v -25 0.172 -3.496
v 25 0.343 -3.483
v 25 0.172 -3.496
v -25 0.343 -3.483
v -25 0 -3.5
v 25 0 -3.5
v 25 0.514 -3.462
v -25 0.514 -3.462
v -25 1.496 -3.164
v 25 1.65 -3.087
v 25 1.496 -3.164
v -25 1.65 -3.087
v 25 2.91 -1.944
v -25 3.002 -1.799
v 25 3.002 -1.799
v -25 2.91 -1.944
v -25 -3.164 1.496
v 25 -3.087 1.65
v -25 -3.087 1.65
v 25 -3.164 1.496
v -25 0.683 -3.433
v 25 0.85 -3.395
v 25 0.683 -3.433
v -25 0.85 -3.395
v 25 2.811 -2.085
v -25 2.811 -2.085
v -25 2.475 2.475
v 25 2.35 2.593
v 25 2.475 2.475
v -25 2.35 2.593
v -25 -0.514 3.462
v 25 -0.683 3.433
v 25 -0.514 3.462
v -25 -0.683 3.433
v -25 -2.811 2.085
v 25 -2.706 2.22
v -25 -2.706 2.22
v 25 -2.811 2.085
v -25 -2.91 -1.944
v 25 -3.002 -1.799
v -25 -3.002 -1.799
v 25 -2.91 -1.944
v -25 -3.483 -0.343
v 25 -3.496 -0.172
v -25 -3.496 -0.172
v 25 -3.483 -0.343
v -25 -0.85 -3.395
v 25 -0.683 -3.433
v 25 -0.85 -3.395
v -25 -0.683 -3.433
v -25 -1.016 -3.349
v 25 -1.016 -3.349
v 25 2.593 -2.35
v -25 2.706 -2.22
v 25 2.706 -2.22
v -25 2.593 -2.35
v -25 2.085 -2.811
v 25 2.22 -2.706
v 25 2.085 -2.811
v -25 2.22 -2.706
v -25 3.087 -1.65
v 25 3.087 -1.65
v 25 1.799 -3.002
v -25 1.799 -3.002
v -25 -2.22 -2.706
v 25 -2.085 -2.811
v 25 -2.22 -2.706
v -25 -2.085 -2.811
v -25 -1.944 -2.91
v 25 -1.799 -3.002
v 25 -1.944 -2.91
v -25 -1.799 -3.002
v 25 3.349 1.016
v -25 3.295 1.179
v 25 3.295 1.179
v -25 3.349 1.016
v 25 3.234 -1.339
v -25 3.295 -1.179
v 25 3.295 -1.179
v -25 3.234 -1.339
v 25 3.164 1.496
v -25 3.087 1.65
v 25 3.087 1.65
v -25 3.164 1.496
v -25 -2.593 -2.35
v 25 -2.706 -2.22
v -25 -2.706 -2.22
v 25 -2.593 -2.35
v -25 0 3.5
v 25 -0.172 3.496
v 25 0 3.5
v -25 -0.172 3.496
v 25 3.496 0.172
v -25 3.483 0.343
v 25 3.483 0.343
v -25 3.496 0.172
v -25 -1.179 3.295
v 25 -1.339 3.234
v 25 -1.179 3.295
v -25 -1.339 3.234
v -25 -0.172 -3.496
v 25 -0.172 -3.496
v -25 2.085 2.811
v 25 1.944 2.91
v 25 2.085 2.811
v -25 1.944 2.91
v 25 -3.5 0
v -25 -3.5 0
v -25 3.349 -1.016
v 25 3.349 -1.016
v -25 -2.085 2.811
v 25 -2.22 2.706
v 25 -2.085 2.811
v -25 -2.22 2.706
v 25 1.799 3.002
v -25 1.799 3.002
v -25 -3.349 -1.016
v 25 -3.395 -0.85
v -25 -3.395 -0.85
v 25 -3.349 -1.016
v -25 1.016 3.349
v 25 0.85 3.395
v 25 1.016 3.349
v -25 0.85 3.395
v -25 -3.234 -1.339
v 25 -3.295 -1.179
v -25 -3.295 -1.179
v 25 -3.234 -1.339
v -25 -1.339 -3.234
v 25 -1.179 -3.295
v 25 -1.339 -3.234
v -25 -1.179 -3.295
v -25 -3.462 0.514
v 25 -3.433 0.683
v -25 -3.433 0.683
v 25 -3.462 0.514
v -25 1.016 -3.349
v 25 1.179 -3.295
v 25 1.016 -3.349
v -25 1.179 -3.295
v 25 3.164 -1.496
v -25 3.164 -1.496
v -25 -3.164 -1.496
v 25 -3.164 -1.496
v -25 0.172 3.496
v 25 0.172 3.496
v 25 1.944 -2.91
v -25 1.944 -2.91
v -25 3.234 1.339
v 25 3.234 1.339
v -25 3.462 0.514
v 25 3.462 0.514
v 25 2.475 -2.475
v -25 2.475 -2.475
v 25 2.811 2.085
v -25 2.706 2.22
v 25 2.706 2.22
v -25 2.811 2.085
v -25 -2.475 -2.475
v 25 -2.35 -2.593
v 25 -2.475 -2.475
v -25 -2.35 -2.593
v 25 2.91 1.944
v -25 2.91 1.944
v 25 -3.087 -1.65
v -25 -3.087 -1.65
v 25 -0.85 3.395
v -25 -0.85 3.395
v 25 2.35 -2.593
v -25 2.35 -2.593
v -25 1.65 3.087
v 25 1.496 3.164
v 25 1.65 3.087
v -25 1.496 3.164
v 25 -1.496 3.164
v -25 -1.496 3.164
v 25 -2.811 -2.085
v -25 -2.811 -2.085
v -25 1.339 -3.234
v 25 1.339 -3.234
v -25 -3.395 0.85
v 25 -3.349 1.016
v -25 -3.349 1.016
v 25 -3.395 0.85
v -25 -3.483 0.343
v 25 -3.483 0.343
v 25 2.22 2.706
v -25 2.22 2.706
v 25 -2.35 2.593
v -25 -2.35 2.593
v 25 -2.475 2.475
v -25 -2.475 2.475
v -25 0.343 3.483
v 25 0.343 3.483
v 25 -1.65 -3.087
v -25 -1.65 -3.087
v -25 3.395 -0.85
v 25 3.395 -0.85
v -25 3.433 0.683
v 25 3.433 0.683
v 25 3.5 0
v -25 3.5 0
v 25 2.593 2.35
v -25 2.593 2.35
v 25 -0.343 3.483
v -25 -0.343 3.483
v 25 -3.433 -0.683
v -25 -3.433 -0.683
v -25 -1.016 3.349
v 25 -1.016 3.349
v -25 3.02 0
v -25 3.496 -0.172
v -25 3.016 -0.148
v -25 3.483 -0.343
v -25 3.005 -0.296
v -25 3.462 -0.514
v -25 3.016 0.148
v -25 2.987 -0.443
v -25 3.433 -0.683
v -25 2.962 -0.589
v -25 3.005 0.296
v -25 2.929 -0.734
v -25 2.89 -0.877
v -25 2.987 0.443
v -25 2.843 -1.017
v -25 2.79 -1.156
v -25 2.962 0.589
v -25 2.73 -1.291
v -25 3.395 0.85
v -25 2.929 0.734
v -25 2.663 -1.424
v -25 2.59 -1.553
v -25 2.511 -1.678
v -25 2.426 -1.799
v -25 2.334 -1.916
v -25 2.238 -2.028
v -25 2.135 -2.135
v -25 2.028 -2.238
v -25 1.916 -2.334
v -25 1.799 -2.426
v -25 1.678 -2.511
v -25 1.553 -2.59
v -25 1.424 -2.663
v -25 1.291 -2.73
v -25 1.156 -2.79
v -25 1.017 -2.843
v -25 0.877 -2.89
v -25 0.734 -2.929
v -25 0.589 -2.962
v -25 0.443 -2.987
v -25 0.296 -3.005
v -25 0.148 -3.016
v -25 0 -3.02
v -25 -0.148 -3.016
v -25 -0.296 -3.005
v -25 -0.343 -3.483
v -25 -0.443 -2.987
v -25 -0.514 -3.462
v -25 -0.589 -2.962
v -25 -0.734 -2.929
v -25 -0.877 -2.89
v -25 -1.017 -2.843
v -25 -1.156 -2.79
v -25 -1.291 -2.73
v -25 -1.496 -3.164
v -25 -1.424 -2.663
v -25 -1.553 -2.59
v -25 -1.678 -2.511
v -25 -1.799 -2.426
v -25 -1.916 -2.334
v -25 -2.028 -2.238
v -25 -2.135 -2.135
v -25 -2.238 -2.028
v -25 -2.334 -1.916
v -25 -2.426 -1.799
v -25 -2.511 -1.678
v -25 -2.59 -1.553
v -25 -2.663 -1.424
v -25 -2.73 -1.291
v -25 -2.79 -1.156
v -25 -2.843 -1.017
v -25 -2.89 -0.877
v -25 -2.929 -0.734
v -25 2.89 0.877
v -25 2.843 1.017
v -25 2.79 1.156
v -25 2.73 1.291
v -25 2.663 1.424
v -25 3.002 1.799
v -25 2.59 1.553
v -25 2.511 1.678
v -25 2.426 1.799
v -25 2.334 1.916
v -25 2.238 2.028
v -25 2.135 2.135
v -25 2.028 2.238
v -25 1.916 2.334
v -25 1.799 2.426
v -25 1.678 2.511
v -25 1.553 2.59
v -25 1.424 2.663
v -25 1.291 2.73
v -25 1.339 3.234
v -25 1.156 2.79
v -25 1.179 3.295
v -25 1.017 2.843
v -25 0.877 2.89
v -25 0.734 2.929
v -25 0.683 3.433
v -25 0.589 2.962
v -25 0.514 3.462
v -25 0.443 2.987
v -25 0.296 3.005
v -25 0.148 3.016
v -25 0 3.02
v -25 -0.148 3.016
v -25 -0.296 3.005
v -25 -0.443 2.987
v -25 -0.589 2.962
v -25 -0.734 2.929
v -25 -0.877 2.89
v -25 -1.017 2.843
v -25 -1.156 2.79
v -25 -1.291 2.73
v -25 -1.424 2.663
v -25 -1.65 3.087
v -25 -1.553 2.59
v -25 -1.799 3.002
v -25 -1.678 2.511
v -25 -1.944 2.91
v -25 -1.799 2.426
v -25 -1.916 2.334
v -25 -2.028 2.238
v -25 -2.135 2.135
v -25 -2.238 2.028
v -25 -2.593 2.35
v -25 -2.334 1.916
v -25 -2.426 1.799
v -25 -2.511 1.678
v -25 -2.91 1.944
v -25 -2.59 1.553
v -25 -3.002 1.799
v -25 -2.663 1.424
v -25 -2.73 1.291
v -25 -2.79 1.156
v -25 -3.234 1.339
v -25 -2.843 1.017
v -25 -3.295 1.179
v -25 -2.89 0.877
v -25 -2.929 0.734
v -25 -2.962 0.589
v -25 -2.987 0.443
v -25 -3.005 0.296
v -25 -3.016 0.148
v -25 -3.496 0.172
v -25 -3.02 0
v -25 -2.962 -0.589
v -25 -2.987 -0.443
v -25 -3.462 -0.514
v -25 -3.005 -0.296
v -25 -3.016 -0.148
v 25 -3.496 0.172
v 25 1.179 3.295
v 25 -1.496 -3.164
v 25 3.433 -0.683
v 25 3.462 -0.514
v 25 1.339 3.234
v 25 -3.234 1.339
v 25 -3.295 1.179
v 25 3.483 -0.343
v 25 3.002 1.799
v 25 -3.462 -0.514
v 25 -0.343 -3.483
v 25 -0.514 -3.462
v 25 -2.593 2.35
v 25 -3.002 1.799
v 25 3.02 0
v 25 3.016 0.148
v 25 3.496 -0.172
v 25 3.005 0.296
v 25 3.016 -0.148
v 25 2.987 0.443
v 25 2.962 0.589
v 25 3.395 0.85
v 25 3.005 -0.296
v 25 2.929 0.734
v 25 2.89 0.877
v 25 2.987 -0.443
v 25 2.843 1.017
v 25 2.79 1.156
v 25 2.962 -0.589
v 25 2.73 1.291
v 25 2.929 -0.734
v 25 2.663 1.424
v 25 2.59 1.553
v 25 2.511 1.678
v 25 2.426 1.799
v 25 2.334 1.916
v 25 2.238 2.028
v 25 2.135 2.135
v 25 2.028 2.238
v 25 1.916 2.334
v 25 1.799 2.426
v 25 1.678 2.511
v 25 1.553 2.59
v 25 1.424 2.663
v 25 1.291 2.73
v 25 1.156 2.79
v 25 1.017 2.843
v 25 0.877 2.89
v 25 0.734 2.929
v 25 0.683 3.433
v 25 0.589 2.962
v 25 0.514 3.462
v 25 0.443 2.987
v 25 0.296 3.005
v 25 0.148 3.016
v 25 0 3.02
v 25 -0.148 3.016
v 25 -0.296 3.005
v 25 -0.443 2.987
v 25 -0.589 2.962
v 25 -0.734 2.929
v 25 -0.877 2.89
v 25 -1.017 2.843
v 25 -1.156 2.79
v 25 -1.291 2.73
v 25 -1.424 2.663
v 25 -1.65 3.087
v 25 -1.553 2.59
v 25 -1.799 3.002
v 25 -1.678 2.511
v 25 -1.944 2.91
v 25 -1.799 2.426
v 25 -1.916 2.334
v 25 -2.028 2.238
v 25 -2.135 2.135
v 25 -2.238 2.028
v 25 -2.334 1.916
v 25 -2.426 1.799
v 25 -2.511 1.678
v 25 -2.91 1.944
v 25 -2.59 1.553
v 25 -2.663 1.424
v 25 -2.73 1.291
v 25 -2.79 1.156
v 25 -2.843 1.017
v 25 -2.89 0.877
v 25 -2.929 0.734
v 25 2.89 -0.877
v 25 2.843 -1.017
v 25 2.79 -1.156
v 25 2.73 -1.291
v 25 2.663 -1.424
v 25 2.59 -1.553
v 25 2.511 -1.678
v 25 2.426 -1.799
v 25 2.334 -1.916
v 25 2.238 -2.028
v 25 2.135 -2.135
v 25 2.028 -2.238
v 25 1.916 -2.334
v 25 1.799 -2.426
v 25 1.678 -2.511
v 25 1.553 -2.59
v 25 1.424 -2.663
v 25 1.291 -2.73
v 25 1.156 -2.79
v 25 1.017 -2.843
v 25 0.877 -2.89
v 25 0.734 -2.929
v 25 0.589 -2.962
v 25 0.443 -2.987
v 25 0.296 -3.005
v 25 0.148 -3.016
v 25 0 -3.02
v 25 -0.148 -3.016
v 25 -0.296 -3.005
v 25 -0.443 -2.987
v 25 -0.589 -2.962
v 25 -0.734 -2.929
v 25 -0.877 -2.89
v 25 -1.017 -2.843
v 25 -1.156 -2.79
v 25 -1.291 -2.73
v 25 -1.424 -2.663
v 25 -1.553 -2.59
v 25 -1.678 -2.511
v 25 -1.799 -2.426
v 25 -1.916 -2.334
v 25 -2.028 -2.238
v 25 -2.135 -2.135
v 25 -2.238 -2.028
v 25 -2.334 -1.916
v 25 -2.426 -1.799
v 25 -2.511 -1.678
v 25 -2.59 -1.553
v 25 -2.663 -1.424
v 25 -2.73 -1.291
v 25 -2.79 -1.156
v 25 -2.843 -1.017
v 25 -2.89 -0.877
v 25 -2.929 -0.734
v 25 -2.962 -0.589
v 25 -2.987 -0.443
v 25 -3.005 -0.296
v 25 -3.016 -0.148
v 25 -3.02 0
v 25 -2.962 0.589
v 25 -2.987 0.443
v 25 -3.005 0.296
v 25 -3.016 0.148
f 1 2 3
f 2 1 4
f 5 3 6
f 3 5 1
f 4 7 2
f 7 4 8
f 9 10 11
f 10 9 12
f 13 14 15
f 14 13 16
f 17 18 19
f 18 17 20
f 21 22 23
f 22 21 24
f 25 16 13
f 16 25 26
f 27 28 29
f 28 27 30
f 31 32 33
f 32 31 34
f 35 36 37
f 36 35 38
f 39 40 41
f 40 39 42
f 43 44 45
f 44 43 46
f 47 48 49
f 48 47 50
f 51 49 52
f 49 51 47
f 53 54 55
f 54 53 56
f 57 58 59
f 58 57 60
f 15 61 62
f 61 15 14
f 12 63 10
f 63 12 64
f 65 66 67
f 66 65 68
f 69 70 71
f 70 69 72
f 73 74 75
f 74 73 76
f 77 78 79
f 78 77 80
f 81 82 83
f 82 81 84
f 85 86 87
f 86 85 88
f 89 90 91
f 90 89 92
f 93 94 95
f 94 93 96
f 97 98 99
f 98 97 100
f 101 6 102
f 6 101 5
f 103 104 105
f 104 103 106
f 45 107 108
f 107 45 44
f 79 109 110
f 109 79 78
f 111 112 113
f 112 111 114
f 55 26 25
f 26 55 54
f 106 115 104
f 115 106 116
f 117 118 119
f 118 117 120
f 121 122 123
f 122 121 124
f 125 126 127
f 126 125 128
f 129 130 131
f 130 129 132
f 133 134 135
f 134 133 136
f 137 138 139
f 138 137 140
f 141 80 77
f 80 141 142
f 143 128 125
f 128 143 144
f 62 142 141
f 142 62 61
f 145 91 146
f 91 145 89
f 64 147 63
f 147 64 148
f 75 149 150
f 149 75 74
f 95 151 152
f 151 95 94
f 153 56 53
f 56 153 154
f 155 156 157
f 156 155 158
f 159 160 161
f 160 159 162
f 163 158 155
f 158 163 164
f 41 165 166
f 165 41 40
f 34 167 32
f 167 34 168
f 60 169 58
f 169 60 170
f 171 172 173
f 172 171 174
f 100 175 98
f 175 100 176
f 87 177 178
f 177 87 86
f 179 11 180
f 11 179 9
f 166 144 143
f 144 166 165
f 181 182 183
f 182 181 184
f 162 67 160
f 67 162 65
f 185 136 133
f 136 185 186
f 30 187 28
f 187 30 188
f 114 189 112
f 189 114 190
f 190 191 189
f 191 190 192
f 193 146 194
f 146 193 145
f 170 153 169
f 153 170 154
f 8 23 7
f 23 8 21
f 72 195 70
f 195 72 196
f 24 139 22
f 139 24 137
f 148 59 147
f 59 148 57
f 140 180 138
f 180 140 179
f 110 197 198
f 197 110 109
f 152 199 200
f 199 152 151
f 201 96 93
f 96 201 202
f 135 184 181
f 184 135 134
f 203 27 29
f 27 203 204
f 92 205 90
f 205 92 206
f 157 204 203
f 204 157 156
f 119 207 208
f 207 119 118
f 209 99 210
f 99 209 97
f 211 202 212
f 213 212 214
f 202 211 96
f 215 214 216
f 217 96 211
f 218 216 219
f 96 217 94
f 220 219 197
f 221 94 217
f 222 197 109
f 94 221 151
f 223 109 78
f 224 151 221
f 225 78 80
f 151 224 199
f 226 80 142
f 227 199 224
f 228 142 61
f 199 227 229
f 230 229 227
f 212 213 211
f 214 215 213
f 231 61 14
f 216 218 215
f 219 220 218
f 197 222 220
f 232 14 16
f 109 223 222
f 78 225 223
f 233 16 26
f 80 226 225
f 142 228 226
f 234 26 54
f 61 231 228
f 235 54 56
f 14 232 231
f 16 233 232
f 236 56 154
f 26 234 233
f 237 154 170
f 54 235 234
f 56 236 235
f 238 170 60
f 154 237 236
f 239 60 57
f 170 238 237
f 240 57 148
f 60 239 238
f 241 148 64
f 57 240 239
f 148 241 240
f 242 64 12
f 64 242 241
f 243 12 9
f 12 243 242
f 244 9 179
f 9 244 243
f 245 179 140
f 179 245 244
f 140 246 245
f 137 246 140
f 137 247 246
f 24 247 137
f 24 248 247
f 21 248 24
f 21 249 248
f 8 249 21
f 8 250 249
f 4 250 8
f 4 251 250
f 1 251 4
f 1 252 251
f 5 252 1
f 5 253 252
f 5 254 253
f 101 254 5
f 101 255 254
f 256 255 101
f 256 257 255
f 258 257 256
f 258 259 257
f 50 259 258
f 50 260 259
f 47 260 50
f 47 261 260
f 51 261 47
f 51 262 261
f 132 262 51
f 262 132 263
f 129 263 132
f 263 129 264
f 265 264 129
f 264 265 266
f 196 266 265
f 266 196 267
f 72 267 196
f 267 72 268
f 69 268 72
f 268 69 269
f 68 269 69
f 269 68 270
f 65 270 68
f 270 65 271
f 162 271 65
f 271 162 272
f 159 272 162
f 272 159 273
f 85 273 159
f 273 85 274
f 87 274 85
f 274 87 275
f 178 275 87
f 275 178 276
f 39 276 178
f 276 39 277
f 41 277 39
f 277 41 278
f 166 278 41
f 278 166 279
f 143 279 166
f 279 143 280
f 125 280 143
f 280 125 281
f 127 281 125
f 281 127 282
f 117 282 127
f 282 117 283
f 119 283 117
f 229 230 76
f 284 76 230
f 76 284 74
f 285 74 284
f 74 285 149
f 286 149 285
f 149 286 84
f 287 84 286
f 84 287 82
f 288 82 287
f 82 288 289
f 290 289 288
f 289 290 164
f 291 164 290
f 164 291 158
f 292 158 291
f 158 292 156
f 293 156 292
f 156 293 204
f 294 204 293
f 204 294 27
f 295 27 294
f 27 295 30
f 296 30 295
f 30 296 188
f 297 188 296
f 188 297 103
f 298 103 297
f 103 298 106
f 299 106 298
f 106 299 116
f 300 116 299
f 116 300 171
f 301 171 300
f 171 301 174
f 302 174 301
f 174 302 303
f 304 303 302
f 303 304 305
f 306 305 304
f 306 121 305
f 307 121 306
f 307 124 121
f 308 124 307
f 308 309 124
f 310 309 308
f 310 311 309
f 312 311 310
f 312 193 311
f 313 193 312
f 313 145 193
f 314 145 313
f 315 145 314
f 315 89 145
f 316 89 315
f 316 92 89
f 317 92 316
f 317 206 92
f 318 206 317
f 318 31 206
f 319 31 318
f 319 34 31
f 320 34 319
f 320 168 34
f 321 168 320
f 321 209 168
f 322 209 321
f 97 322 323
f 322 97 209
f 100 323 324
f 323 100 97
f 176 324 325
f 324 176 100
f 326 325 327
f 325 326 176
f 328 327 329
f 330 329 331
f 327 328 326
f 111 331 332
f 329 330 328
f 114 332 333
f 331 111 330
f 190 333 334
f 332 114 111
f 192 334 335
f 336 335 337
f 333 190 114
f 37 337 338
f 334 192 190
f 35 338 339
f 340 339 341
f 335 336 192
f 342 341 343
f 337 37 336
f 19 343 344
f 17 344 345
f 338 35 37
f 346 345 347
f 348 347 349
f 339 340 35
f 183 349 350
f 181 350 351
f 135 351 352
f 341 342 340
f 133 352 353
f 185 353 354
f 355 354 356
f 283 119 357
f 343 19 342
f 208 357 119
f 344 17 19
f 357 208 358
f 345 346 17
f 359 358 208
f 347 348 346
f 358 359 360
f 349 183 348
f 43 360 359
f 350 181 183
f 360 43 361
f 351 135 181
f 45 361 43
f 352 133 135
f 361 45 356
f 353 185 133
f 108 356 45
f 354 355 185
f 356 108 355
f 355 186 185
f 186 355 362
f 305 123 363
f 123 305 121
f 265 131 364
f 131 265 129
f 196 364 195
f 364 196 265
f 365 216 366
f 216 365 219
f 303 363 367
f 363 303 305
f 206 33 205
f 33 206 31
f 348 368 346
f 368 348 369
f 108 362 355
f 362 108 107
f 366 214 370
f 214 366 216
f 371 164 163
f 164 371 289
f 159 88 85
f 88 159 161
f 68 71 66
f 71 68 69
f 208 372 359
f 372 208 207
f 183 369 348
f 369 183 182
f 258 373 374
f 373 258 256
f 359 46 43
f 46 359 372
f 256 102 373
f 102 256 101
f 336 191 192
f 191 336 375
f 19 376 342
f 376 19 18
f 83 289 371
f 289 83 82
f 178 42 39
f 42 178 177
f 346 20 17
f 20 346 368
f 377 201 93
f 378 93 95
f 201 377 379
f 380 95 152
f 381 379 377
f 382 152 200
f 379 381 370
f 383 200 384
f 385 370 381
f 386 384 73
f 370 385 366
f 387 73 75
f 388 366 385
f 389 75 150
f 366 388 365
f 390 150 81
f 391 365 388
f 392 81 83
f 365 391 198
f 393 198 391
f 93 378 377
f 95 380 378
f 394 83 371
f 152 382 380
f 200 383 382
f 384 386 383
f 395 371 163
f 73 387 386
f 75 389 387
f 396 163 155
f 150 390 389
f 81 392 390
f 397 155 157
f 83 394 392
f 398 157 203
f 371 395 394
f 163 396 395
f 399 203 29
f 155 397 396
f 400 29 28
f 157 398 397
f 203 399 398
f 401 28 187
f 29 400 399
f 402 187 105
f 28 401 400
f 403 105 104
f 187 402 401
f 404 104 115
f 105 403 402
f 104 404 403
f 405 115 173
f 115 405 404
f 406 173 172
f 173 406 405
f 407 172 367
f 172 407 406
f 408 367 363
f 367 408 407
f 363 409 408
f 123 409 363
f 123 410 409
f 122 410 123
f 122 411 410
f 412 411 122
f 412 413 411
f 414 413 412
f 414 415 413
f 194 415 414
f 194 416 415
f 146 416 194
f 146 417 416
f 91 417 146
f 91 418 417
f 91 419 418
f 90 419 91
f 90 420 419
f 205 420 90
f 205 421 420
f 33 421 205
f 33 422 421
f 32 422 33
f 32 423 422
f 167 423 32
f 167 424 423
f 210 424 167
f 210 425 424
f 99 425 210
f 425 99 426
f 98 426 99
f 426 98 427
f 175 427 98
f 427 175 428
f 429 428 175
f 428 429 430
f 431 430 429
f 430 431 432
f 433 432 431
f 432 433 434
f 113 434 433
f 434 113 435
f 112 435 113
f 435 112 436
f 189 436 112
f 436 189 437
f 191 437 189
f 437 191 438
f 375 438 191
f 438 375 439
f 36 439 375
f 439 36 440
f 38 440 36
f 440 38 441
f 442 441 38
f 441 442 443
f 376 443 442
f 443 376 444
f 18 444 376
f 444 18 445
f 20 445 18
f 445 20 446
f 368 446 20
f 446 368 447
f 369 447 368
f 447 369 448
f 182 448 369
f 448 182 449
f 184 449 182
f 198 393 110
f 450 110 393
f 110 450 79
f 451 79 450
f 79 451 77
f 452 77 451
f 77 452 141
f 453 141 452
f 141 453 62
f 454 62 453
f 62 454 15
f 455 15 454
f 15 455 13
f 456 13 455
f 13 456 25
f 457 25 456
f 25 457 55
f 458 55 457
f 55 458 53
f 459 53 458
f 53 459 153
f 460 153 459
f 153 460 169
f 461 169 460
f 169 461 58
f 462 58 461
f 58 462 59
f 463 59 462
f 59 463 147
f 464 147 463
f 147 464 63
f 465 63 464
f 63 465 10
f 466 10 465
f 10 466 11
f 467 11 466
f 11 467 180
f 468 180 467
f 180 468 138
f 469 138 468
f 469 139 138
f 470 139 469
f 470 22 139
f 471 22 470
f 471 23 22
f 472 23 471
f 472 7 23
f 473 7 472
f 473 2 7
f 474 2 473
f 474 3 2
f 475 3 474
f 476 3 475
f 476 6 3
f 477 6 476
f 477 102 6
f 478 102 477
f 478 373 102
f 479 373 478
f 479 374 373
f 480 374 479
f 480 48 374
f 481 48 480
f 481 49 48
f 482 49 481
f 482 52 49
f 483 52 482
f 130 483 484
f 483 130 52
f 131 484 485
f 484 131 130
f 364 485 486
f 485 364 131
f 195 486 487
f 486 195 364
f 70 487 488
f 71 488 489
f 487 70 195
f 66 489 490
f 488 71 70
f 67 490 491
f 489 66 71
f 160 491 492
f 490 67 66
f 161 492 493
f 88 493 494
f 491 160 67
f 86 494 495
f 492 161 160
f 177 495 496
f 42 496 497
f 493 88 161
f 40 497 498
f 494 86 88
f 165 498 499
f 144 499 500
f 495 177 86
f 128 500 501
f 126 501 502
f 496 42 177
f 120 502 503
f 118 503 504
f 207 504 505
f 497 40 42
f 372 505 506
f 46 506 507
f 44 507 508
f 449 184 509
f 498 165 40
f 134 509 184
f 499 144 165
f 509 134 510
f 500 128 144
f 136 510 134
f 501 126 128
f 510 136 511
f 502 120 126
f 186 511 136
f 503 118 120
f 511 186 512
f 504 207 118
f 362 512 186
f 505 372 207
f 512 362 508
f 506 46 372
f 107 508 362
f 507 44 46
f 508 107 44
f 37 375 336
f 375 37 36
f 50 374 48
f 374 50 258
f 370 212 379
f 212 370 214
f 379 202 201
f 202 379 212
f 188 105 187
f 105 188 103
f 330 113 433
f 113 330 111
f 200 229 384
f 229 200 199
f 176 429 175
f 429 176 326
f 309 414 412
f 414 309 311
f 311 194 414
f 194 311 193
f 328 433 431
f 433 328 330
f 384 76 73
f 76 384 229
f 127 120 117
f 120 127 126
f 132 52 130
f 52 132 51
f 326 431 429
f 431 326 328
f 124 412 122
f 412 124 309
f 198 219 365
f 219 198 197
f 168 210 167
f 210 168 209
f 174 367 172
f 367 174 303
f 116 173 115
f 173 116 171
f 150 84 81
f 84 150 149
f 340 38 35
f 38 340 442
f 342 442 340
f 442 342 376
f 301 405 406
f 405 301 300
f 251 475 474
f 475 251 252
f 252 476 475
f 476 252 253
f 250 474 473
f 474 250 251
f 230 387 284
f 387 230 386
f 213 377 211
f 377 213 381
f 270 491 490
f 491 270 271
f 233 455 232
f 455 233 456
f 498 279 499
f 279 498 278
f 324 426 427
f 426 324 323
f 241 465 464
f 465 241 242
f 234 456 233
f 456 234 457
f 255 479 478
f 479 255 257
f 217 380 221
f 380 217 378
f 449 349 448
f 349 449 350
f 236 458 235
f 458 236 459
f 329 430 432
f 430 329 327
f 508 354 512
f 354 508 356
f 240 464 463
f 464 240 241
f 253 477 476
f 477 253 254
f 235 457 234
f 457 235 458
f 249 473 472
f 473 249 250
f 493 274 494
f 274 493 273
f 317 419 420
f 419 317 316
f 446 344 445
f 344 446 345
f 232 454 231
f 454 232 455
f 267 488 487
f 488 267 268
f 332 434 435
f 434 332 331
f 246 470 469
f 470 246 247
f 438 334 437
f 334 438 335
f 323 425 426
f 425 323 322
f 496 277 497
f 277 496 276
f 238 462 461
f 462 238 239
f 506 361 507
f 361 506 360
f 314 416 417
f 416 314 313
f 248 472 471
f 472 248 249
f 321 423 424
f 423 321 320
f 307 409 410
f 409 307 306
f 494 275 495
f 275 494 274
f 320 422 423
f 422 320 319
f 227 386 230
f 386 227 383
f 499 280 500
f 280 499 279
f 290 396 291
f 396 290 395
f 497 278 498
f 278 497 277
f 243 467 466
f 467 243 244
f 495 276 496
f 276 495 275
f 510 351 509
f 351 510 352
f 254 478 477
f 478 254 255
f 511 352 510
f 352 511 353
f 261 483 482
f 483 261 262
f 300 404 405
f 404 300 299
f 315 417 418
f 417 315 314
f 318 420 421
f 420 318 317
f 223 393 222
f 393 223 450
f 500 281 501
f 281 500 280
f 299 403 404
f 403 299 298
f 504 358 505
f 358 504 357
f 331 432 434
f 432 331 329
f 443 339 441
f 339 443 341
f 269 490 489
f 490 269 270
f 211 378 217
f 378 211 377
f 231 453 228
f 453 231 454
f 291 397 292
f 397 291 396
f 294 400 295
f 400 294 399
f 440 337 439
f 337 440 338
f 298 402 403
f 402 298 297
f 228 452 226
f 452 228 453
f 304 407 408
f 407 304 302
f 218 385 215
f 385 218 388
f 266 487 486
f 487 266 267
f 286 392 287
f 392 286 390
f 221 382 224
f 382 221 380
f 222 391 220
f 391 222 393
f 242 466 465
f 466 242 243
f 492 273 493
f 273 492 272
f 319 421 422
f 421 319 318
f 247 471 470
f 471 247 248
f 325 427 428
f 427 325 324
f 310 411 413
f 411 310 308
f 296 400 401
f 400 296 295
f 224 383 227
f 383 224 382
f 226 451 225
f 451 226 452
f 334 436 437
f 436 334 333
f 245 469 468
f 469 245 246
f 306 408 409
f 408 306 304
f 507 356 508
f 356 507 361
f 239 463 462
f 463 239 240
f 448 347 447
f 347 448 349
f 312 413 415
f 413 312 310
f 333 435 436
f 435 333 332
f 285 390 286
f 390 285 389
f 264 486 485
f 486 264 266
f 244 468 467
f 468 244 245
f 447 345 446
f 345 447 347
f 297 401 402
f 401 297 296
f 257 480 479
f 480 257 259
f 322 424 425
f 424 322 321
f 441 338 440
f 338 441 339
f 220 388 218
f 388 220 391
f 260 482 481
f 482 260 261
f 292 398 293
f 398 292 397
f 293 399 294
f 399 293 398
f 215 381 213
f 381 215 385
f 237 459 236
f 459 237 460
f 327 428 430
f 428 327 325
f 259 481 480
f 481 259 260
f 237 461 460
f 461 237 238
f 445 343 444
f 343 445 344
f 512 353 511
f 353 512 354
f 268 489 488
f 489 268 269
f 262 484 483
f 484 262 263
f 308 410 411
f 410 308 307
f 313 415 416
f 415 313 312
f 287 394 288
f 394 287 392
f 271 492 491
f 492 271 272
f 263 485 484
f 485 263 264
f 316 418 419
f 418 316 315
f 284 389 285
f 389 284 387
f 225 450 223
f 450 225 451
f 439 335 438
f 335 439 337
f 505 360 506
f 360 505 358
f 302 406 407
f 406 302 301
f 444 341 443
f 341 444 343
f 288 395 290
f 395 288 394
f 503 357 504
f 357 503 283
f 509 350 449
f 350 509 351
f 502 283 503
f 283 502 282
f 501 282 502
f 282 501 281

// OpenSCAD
// Heatshrink sleeving - hollow tube (single connected solid), oriented for clearer views

$fn = 128;

// Parameters
sleeve_L = 50;        //[25:100:1]
sleeve_ID = 6;        //[3:12:0.5]
sleeve_wall = 0.5;    //[0.25:1.5:0.05]
clearance = 0.02;     // small radial clearance to avoid coincident surfaces
void_extra = 0.5;     // extend inner void slightly past ends for a clean through-hole

// Derived
sleeve_OD = sleeve_ID + 2*sleeve_wall;

// Base tube (hollow)
module heatshrink_sleeve() {
  difference() {
    // Outer tube
    cylinder(h = sleeve_L, r = sleeve_OD/2, center = true);

    // Inner void: slightly longer and slightly larger radius to ensure robust boolean
    cylinder(h = sleeve_L + 2*void_extra, r = sleeve_ID/2 + clearance, center = true);
  }
}

// Orient along X so front/back/left/right show length (not just cross-section)
rotate([0, 90, 0]) heatshrink_sleeve();
